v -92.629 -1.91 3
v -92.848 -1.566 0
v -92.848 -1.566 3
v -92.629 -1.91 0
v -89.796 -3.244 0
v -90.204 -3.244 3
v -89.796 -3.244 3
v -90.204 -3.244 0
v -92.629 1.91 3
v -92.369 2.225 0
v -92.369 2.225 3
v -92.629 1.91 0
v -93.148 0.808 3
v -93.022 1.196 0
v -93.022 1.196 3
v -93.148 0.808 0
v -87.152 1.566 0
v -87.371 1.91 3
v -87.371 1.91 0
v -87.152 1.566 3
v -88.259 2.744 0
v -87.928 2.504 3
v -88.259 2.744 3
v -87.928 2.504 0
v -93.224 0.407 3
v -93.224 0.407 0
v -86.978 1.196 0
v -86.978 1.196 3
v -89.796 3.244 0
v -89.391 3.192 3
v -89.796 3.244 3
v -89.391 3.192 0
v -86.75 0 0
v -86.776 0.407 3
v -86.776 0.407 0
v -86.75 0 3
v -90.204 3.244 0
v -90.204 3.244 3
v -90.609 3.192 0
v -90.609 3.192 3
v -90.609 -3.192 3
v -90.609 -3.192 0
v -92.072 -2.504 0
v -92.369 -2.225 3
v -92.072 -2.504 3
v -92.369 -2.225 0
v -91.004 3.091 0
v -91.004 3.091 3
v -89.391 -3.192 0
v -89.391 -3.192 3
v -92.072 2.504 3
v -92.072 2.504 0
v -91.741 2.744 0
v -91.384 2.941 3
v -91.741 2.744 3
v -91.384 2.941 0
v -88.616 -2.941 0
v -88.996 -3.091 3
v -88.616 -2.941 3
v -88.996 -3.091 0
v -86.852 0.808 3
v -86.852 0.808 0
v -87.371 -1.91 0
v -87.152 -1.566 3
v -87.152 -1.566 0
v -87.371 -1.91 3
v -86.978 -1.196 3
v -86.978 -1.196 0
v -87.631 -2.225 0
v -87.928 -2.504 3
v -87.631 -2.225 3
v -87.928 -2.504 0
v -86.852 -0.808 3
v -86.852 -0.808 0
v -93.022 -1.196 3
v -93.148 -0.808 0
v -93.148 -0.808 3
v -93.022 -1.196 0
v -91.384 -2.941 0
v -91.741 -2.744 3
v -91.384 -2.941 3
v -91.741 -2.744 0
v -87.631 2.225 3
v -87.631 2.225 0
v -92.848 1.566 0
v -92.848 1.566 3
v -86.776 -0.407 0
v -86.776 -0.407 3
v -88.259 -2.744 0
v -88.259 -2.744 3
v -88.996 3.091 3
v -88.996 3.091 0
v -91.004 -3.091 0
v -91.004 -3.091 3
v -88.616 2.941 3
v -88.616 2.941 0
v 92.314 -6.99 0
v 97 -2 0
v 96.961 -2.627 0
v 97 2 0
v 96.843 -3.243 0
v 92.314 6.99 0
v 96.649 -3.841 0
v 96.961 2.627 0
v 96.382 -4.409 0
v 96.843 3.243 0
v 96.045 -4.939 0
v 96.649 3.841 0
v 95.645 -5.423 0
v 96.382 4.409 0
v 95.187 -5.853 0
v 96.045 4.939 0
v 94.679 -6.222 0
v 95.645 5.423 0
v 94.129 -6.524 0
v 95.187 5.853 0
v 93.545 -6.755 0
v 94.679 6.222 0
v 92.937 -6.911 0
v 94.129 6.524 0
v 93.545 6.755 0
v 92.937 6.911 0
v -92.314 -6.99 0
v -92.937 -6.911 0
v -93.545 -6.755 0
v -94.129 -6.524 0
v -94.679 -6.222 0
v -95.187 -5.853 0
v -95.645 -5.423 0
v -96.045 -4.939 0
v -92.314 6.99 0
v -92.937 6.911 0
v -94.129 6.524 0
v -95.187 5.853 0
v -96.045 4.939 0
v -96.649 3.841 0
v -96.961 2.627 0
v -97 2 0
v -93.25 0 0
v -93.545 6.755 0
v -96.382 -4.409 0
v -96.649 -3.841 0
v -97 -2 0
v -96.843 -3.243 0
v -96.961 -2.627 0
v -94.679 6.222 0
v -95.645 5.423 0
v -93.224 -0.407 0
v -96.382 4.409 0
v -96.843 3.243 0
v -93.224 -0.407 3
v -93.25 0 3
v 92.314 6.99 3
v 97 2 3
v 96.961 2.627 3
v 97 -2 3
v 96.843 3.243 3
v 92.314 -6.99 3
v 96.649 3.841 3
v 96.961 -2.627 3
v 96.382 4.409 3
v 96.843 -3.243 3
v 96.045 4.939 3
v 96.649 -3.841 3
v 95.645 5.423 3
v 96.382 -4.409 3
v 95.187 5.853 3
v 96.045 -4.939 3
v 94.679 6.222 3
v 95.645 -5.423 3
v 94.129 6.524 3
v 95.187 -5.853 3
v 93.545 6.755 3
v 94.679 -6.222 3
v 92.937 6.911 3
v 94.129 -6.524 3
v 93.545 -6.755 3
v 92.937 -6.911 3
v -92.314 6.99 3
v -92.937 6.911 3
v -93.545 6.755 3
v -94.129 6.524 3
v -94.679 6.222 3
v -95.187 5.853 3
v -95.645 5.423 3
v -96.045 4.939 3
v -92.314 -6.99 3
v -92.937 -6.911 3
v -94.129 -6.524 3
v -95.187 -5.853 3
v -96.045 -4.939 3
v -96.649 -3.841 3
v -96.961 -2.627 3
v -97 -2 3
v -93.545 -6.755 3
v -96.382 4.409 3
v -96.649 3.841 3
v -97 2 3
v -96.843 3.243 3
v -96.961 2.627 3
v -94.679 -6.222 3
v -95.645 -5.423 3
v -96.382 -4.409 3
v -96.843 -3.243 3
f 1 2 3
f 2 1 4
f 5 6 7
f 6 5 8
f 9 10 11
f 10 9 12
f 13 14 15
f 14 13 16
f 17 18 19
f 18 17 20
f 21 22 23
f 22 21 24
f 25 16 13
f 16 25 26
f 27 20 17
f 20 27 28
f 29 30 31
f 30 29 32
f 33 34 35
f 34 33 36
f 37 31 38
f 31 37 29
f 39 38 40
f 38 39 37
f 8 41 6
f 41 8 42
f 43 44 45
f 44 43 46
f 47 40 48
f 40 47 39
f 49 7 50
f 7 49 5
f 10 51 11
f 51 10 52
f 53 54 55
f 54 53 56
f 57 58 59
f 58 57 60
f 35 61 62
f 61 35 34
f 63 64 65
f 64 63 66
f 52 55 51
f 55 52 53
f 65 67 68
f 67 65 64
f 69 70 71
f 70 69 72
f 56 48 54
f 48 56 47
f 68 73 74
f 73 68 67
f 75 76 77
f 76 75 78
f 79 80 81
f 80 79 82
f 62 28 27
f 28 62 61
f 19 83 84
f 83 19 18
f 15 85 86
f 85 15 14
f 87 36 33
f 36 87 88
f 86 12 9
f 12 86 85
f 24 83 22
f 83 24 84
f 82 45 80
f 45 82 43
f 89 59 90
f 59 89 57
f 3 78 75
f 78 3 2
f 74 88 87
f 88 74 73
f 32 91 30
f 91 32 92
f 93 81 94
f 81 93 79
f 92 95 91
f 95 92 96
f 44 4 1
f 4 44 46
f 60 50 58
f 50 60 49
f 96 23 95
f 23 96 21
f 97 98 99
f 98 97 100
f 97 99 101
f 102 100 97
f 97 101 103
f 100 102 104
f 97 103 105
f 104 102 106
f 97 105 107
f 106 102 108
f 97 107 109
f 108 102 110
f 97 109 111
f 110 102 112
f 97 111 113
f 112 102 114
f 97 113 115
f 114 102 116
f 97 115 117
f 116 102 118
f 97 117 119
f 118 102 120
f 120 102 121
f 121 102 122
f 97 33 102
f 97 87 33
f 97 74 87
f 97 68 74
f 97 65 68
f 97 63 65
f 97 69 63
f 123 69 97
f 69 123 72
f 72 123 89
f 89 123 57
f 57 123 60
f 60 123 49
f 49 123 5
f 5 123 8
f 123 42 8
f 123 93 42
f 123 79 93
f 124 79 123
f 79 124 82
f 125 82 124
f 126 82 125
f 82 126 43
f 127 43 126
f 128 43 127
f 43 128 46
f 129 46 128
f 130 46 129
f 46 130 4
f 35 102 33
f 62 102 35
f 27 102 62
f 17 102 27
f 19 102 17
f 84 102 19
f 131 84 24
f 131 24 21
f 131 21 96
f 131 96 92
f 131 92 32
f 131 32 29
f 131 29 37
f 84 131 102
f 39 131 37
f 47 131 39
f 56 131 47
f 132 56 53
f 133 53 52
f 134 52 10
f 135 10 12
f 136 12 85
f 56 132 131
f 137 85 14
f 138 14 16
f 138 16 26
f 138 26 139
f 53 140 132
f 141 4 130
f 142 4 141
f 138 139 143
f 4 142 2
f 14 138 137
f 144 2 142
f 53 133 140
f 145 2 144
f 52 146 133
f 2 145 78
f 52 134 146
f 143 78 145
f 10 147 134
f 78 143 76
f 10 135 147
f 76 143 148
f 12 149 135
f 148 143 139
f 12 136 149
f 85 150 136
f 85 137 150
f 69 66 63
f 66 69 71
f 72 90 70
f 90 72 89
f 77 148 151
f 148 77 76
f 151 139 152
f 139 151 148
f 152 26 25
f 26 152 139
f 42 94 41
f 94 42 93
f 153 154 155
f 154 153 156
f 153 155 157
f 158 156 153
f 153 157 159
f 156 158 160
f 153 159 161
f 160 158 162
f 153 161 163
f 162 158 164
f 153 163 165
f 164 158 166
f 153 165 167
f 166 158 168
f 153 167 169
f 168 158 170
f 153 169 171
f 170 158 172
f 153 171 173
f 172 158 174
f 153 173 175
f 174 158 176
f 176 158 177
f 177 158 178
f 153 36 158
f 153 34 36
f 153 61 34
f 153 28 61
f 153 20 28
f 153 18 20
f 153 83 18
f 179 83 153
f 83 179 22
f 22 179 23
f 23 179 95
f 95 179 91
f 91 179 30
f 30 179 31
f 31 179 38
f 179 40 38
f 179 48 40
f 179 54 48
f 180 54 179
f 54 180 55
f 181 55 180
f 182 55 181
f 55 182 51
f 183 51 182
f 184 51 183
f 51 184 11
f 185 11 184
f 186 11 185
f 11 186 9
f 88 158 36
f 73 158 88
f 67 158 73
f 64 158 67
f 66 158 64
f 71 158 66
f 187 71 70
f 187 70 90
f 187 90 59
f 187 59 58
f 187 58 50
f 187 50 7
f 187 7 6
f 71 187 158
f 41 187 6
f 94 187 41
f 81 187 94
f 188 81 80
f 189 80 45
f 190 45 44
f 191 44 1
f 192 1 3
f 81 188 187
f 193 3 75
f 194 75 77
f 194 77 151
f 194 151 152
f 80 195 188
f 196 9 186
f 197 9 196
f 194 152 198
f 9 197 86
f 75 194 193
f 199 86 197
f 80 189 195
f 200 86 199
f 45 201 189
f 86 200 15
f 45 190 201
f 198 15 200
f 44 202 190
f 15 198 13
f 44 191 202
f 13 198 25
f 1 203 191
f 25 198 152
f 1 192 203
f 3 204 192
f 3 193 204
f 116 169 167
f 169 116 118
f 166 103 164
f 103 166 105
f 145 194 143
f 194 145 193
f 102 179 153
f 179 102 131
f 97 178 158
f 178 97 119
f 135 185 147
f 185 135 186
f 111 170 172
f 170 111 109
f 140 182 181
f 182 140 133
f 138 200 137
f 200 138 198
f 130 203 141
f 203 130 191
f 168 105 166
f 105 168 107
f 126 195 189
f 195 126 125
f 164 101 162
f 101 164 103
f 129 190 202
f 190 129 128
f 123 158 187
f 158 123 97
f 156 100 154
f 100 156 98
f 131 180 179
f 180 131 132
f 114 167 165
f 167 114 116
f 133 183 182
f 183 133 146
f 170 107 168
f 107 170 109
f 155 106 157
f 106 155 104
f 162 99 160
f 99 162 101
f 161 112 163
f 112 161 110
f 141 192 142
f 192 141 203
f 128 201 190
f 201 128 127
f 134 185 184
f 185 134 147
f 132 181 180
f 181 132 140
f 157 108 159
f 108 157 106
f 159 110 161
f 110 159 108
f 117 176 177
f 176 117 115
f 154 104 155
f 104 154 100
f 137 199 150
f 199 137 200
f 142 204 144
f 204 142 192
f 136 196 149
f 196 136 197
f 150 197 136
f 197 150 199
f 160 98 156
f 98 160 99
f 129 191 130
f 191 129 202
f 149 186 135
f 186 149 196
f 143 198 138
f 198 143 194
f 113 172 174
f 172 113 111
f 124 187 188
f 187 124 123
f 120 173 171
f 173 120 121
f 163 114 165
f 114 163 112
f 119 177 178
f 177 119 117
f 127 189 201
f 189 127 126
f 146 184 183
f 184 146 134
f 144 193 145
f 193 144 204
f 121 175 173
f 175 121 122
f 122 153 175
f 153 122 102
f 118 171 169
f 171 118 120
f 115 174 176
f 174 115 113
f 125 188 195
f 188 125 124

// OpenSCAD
$fn = 50;


difference() {
	union() {
		hull() {
			translate(v = [-92.0000000000, 2.0000000000, 0]) {
				cylinder(h = 3, r = 5);
			}
			translate(v = [92.0000000000, 2.0000000000, 0]) {
				cylinder(h = 3, r = 5);
			}
			translate(v = [-92.0000000000, -2.0000000000, 0]) {
				cylinder(h = 3, r = 5);
			}
			translate(v = [92.0000000000, -2.0000000000, 0]) {
				cylinder(h = 3, r = 5);
			}
		}
	}
	union() {
		translate(v = [-90.0000000000, 0.0000000000, 0]) {
			cylinder(h = 3, r = 3.2500000000);
		}
		translate(v = [-90.0000000000, 0.0000000000, 0]) {
			cylinder(h = 3, r = 1.8000000000);
		}
		translate(v = [-90.0000000000, 0.0000000000, 0]) {
			cylinder(h = 3, r = 1.8000000000);
		}
		translate(v = [-90.0000000000, 0.0000000000, 0]) {
			cylinder(h = 3, r = 1.8000000000);
		}
	}
}
